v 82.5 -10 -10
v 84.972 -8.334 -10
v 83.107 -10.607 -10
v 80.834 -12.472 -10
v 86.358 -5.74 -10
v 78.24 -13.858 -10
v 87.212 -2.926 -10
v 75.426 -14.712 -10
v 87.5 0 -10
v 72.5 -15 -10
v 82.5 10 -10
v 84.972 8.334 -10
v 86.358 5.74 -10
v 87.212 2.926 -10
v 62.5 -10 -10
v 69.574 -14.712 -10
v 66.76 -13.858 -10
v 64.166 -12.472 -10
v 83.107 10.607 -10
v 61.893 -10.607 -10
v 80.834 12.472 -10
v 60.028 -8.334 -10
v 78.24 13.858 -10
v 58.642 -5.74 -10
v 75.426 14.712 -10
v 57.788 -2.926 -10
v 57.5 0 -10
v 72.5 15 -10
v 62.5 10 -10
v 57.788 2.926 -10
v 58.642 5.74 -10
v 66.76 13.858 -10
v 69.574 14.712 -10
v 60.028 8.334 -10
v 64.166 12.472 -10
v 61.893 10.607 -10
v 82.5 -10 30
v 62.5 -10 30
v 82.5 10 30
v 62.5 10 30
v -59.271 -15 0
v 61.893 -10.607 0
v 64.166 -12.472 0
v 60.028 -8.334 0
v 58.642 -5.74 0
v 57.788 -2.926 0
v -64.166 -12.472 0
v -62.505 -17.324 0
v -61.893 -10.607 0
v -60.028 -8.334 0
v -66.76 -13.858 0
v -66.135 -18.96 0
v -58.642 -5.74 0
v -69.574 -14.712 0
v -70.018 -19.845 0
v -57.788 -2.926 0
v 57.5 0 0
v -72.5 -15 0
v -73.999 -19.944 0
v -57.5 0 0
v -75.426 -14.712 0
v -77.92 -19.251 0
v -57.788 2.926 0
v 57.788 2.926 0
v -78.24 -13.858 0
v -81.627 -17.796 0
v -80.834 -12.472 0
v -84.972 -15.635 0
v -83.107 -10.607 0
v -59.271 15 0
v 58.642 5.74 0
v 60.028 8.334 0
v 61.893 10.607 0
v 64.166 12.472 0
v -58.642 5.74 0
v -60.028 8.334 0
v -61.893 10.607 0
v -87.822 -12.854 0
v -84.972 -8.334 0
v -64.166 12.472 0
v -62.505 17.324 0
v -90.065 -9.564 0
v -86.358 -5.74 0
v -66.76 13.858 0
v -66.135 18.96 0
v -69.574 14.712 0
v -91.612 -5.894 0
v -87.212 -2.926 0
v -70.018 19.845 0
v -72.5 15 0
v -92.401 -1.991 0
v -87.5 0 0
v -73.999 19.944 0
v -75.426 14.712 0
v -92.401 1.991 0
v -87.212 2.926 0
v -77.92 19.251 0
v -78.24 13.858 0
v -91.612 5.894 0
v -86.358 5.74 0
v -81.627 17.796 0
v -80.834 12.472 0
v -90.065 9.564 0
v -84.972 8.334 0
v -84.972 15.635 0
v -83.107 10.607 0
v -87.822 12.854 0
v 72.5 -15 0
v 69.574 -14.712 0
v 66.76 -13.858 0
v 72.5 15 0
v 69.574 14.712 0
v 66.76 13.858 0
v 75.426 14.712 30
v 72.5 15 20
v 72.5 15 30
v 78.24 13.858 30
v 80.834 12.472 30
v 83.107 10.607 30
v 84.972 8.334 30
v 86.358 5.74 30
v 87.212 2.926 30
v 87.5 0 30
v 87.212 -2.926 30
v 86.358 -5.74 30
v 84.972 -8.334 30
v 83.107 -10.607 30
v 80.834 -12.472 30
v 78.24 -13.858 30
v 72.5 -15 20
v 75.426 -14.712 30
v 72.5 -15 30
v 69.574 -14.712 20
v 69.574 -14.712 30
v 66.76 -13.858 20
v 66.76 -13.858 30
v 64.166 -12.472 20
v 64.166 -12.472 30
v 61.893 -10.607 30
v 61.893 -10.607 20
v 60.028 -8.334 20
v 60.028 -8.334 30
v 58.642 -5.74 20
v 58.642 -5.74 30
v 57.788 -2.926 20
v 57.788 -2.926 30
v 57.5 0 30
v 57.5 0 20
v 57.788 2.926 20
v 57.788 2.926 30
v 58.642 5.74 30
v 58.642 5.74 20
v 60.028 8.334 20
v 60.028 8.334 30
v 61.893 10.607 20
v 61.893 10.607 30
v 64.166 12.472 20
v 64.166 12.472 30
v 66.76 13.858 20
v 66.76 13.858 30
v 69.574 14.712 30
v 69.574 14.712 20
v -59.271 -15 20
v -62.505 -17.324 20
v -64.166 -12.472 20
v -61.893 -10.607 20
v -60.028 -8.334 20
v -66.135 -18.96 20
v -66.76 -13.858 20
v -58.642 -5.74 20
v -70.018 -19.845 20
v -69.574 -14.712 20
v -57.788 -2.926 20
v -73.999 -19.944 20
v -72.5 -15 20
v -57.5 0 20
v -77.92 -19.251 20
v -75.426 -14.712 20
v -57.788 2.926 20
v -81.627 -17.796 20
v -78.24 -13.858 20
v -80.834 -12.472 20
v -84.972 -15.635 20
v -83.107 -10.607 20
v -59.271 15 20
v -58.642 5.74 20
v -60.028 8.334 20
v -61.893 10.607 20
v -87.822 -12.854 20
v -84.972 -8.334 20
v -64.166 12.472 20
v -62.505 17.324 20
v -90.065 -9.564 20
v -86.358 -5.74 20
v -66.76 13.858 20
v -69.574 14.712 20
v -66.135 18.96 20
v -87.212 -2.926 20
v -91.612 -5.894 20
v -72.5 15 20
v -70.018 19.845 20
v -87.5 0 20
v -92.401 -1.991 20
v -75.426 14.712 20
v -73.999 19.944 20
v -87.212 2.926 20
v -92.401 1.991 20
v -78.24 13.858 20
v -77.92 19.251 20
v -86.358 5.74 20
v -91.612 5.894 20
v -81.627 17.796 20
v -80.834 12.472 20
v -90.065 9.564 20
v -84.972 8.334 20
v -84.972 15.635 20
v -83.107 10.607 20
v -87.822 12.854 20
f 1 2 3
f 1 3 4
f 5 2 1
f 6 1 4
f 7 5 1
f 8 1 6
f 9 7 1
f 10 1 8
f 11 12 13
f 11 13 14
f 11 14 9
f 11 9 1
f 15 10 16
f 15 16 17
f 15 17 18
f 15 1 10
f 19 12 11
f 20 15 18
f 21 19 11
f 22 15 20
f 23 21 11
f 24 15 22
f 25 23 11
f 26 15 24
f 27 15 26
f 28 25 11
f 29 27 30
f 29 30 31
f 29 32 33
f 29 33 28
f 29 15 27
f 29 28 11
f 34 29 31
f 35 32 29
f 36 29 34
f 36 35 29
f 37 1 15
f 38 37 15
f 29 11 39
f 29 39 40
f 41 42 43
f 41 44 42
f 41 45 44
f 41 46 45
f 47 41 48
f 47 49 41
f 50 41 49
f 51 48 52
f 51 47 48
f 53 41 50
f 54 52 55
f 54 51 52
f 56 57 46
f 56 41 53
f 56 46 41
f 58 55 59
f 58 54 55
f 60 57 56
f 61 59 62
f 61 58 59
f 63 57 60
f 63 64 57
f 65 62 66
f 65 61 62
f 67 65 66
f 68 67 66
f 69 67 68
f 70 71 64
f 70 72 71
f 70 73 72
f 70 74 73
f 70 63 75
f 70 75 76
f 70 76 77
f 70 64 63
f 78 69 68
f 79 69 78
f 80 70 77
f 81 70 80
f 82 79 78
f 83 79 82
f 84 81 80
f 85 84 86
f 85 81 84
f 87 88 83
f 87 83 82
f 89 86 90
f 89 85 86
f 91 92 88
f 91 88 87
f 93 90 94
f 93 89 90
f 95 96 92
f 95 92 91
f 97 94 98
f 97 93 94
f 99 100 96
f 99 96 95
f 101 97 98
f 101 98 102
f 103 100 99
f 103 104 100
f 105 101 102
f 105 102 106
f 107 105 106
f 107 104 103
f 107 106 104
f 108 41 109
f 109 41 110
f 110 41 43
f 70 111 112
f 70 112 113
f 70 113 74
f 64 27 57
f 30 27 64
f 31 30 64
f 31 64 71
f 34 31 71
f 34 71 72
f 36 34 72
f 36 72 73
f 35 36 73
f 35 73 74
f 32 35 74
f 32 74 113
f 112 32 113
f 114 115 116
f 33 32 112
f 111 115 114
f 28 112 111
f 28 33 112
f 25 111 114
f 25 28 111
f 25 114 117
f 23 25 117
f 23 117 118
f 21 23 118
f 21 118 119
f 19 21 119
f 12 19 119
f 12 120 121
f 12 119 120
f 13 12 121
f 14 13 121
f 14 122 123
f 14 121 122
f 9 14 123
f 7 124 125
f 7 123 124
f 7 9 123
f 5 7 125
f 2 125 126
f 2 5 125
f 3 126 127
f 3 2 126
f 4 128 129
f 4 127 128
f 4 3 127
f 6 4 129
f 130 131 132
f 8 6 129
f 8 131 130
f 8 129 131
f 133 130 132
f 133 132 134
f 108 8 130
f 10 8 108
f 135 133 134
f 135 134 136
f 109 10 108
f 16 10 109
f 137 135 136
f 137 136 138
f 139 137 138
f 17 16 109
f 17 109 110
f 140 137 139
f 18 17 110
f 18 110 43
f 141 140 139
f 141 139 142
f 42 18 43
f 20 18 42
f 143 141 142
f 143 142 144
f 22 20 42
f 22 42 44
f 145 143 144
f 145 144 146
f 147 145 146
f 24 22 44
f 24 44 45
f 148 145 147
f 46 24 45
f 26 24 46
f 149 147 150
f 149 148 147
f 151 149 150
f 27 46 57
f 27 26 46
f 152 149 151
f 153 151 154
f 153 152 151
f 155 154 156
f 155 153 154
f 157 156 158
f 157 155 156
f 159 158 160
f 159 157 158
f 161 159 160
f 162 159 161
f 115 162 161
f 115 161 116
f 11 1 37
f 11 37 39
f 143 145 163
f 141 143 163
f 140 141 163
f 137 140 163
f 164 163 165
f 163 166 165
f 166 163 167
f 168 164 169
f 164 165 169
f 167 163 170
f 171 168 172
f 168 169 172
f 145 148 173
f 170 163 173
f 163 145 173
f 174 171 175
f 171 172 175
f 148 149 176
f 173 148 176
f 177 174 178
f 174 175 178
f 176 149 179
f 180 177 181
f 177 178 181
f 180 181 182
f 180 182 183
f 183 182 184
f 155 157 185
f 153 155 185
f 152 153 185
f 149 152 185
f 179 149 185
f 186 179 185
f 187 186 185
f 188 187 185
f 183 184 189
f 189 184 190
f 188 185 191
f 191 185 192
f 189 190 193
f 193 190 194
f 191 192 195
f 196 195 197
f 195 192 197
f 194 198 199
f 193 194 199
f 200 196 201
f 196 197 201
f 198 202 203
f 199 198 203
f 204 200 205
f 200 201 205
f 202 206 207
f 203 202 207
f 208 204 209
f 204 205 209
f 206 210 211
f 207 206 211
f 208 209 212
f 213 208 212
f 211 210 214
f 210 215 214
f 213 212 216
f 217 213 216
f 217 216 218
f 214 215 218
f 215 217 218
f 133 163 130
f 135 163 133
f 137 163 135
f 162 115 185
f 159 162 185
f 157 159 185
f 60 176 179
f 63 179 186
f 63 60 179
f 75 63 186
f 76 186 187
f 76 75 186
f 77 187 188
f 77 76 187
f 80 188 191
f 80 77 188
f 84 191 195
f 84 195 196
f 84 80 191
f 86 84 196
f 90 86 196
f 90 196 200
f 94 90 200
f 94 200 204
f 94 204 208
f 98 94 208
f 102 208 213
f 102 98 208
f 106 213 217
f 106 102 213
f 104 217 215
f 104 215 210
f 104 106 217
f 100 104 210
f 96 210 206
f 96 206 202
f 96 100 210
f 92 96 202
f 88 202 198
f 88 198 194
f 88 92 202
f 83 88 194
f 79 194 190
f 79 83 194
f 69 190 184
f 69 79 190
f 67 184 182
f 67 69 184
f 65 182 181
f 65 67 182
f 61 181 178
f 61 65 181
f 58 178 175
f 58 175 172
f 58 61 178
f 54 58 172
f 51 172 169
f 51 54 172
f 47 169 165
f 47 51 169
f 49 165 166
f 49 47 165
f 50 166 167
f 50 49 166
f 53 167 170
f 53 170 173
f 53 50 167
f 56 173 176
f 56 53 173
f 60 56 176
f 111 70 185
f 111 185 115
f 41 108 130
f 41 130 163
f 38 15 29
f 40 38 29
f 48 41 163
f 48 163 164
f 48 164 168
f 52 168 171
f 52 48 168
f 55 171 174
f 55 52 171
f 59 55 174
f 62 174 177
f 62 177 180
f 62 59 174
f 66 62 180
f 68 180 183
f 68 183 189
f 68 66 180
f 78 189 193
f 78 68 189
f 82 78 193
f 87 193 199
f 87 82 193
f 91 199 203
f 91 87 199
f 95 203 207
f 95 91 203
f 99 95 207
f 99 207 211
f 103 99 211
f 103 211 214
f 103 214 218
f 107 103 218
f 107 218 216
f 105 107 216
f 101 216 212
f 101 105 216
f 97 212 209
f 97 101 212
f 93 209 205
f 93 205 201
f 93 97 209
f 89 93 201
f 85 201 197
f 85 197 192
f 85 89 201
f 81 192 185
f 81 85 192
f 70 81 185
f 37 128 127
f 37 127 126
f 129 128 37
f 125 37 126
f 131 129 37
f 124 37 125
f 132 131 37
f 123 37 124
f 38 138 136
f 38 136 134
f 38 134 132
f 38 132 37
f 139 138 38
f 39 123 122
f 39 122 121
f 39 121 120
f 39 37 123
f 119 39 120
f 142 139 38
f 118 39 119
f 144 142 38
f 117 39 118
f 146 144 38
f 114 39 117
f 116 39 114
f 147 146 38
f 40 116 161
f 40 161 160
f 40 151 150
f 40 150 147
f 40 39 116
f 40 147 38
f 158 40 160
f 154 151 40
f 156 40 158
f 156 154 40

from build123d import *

# Parameters (mm, degrees)
SKETCH1_R           = 15
BOSS_EXTRUDE2_DEPTH = 20
SKETCH3_R           = 15
BOSS_EXTRUDE3_DEPTH = 10
BOSS_EXTRUDE4_START = 10
SKETCH5_R           = 15
BOSS_EXTRUDE4_DEPTH = 10
SKETCH6_W           = 20
SKETCH6_H           = 20
CUT_EXTRUDE1_DEPTH  = 50


with BuildPart() as part:
    # Sketch1 → Boss-Extrude2 (new body)
    with BuildSketch(Plane.XY):
        with BuildLine():
            Line((72.5, -15), (-59.271243445, -15))
            ThreePointArc((-59.271243445, -15), (-92.5, 0), (-59.271243445, 15))
            Line((-59.271243445, 15), (72.5, 15))
            ThreePointArc((72.5, 15), (87.5, 0), (72.5, -15))
        make_face()
        with Locations((-72.5, 0)):
            Circle(SKETCH1_R, mode=Mode.SUBTRACT)
    extrude(amount=BOSS_EXTRUDE2_DEPTH)

    # Sketch3 → Boss-Extrude3 (add)
    with BuildSketch(Plane.XY.offset(20)):
        with Locations(Location((72.5, 0, 0), (0, 0, 90))):
            Circle(SKETCH3_R)
    extrude(amount=BOSS_EXTRUDE3_DEPTH)

    # Sketch5 → Boss-Extrude4 (add)
    with BuildSketch(Plane(origin=(0, 0, 0), x_dir=(-1, 0, 0), z_dir=(0, 0, -1)).offset(BOSS_EXTRUDE4_START)):
        with Locations((-72.5, 0)):
            Circle(SKETCH5_R)
    extrude(amount=-BOSS_EXTRUDE4_DEPTH)

    # Sketch6 → Cut-Extrude1 (cut)
    with BuildSketch(Plane(origin=(0, 0, -10), x_dir=(-1, 0, 0), z_dir=(0, 0, -1))):
        with Locations((-72.5, 0)):
            Rectangle(SKETCH6_W, SKETCH6_H)
    extrude(amount=-CUT_EXTRUDE1_DEPTH, mode=Mode.SUBTRACT)


solid = part.part
